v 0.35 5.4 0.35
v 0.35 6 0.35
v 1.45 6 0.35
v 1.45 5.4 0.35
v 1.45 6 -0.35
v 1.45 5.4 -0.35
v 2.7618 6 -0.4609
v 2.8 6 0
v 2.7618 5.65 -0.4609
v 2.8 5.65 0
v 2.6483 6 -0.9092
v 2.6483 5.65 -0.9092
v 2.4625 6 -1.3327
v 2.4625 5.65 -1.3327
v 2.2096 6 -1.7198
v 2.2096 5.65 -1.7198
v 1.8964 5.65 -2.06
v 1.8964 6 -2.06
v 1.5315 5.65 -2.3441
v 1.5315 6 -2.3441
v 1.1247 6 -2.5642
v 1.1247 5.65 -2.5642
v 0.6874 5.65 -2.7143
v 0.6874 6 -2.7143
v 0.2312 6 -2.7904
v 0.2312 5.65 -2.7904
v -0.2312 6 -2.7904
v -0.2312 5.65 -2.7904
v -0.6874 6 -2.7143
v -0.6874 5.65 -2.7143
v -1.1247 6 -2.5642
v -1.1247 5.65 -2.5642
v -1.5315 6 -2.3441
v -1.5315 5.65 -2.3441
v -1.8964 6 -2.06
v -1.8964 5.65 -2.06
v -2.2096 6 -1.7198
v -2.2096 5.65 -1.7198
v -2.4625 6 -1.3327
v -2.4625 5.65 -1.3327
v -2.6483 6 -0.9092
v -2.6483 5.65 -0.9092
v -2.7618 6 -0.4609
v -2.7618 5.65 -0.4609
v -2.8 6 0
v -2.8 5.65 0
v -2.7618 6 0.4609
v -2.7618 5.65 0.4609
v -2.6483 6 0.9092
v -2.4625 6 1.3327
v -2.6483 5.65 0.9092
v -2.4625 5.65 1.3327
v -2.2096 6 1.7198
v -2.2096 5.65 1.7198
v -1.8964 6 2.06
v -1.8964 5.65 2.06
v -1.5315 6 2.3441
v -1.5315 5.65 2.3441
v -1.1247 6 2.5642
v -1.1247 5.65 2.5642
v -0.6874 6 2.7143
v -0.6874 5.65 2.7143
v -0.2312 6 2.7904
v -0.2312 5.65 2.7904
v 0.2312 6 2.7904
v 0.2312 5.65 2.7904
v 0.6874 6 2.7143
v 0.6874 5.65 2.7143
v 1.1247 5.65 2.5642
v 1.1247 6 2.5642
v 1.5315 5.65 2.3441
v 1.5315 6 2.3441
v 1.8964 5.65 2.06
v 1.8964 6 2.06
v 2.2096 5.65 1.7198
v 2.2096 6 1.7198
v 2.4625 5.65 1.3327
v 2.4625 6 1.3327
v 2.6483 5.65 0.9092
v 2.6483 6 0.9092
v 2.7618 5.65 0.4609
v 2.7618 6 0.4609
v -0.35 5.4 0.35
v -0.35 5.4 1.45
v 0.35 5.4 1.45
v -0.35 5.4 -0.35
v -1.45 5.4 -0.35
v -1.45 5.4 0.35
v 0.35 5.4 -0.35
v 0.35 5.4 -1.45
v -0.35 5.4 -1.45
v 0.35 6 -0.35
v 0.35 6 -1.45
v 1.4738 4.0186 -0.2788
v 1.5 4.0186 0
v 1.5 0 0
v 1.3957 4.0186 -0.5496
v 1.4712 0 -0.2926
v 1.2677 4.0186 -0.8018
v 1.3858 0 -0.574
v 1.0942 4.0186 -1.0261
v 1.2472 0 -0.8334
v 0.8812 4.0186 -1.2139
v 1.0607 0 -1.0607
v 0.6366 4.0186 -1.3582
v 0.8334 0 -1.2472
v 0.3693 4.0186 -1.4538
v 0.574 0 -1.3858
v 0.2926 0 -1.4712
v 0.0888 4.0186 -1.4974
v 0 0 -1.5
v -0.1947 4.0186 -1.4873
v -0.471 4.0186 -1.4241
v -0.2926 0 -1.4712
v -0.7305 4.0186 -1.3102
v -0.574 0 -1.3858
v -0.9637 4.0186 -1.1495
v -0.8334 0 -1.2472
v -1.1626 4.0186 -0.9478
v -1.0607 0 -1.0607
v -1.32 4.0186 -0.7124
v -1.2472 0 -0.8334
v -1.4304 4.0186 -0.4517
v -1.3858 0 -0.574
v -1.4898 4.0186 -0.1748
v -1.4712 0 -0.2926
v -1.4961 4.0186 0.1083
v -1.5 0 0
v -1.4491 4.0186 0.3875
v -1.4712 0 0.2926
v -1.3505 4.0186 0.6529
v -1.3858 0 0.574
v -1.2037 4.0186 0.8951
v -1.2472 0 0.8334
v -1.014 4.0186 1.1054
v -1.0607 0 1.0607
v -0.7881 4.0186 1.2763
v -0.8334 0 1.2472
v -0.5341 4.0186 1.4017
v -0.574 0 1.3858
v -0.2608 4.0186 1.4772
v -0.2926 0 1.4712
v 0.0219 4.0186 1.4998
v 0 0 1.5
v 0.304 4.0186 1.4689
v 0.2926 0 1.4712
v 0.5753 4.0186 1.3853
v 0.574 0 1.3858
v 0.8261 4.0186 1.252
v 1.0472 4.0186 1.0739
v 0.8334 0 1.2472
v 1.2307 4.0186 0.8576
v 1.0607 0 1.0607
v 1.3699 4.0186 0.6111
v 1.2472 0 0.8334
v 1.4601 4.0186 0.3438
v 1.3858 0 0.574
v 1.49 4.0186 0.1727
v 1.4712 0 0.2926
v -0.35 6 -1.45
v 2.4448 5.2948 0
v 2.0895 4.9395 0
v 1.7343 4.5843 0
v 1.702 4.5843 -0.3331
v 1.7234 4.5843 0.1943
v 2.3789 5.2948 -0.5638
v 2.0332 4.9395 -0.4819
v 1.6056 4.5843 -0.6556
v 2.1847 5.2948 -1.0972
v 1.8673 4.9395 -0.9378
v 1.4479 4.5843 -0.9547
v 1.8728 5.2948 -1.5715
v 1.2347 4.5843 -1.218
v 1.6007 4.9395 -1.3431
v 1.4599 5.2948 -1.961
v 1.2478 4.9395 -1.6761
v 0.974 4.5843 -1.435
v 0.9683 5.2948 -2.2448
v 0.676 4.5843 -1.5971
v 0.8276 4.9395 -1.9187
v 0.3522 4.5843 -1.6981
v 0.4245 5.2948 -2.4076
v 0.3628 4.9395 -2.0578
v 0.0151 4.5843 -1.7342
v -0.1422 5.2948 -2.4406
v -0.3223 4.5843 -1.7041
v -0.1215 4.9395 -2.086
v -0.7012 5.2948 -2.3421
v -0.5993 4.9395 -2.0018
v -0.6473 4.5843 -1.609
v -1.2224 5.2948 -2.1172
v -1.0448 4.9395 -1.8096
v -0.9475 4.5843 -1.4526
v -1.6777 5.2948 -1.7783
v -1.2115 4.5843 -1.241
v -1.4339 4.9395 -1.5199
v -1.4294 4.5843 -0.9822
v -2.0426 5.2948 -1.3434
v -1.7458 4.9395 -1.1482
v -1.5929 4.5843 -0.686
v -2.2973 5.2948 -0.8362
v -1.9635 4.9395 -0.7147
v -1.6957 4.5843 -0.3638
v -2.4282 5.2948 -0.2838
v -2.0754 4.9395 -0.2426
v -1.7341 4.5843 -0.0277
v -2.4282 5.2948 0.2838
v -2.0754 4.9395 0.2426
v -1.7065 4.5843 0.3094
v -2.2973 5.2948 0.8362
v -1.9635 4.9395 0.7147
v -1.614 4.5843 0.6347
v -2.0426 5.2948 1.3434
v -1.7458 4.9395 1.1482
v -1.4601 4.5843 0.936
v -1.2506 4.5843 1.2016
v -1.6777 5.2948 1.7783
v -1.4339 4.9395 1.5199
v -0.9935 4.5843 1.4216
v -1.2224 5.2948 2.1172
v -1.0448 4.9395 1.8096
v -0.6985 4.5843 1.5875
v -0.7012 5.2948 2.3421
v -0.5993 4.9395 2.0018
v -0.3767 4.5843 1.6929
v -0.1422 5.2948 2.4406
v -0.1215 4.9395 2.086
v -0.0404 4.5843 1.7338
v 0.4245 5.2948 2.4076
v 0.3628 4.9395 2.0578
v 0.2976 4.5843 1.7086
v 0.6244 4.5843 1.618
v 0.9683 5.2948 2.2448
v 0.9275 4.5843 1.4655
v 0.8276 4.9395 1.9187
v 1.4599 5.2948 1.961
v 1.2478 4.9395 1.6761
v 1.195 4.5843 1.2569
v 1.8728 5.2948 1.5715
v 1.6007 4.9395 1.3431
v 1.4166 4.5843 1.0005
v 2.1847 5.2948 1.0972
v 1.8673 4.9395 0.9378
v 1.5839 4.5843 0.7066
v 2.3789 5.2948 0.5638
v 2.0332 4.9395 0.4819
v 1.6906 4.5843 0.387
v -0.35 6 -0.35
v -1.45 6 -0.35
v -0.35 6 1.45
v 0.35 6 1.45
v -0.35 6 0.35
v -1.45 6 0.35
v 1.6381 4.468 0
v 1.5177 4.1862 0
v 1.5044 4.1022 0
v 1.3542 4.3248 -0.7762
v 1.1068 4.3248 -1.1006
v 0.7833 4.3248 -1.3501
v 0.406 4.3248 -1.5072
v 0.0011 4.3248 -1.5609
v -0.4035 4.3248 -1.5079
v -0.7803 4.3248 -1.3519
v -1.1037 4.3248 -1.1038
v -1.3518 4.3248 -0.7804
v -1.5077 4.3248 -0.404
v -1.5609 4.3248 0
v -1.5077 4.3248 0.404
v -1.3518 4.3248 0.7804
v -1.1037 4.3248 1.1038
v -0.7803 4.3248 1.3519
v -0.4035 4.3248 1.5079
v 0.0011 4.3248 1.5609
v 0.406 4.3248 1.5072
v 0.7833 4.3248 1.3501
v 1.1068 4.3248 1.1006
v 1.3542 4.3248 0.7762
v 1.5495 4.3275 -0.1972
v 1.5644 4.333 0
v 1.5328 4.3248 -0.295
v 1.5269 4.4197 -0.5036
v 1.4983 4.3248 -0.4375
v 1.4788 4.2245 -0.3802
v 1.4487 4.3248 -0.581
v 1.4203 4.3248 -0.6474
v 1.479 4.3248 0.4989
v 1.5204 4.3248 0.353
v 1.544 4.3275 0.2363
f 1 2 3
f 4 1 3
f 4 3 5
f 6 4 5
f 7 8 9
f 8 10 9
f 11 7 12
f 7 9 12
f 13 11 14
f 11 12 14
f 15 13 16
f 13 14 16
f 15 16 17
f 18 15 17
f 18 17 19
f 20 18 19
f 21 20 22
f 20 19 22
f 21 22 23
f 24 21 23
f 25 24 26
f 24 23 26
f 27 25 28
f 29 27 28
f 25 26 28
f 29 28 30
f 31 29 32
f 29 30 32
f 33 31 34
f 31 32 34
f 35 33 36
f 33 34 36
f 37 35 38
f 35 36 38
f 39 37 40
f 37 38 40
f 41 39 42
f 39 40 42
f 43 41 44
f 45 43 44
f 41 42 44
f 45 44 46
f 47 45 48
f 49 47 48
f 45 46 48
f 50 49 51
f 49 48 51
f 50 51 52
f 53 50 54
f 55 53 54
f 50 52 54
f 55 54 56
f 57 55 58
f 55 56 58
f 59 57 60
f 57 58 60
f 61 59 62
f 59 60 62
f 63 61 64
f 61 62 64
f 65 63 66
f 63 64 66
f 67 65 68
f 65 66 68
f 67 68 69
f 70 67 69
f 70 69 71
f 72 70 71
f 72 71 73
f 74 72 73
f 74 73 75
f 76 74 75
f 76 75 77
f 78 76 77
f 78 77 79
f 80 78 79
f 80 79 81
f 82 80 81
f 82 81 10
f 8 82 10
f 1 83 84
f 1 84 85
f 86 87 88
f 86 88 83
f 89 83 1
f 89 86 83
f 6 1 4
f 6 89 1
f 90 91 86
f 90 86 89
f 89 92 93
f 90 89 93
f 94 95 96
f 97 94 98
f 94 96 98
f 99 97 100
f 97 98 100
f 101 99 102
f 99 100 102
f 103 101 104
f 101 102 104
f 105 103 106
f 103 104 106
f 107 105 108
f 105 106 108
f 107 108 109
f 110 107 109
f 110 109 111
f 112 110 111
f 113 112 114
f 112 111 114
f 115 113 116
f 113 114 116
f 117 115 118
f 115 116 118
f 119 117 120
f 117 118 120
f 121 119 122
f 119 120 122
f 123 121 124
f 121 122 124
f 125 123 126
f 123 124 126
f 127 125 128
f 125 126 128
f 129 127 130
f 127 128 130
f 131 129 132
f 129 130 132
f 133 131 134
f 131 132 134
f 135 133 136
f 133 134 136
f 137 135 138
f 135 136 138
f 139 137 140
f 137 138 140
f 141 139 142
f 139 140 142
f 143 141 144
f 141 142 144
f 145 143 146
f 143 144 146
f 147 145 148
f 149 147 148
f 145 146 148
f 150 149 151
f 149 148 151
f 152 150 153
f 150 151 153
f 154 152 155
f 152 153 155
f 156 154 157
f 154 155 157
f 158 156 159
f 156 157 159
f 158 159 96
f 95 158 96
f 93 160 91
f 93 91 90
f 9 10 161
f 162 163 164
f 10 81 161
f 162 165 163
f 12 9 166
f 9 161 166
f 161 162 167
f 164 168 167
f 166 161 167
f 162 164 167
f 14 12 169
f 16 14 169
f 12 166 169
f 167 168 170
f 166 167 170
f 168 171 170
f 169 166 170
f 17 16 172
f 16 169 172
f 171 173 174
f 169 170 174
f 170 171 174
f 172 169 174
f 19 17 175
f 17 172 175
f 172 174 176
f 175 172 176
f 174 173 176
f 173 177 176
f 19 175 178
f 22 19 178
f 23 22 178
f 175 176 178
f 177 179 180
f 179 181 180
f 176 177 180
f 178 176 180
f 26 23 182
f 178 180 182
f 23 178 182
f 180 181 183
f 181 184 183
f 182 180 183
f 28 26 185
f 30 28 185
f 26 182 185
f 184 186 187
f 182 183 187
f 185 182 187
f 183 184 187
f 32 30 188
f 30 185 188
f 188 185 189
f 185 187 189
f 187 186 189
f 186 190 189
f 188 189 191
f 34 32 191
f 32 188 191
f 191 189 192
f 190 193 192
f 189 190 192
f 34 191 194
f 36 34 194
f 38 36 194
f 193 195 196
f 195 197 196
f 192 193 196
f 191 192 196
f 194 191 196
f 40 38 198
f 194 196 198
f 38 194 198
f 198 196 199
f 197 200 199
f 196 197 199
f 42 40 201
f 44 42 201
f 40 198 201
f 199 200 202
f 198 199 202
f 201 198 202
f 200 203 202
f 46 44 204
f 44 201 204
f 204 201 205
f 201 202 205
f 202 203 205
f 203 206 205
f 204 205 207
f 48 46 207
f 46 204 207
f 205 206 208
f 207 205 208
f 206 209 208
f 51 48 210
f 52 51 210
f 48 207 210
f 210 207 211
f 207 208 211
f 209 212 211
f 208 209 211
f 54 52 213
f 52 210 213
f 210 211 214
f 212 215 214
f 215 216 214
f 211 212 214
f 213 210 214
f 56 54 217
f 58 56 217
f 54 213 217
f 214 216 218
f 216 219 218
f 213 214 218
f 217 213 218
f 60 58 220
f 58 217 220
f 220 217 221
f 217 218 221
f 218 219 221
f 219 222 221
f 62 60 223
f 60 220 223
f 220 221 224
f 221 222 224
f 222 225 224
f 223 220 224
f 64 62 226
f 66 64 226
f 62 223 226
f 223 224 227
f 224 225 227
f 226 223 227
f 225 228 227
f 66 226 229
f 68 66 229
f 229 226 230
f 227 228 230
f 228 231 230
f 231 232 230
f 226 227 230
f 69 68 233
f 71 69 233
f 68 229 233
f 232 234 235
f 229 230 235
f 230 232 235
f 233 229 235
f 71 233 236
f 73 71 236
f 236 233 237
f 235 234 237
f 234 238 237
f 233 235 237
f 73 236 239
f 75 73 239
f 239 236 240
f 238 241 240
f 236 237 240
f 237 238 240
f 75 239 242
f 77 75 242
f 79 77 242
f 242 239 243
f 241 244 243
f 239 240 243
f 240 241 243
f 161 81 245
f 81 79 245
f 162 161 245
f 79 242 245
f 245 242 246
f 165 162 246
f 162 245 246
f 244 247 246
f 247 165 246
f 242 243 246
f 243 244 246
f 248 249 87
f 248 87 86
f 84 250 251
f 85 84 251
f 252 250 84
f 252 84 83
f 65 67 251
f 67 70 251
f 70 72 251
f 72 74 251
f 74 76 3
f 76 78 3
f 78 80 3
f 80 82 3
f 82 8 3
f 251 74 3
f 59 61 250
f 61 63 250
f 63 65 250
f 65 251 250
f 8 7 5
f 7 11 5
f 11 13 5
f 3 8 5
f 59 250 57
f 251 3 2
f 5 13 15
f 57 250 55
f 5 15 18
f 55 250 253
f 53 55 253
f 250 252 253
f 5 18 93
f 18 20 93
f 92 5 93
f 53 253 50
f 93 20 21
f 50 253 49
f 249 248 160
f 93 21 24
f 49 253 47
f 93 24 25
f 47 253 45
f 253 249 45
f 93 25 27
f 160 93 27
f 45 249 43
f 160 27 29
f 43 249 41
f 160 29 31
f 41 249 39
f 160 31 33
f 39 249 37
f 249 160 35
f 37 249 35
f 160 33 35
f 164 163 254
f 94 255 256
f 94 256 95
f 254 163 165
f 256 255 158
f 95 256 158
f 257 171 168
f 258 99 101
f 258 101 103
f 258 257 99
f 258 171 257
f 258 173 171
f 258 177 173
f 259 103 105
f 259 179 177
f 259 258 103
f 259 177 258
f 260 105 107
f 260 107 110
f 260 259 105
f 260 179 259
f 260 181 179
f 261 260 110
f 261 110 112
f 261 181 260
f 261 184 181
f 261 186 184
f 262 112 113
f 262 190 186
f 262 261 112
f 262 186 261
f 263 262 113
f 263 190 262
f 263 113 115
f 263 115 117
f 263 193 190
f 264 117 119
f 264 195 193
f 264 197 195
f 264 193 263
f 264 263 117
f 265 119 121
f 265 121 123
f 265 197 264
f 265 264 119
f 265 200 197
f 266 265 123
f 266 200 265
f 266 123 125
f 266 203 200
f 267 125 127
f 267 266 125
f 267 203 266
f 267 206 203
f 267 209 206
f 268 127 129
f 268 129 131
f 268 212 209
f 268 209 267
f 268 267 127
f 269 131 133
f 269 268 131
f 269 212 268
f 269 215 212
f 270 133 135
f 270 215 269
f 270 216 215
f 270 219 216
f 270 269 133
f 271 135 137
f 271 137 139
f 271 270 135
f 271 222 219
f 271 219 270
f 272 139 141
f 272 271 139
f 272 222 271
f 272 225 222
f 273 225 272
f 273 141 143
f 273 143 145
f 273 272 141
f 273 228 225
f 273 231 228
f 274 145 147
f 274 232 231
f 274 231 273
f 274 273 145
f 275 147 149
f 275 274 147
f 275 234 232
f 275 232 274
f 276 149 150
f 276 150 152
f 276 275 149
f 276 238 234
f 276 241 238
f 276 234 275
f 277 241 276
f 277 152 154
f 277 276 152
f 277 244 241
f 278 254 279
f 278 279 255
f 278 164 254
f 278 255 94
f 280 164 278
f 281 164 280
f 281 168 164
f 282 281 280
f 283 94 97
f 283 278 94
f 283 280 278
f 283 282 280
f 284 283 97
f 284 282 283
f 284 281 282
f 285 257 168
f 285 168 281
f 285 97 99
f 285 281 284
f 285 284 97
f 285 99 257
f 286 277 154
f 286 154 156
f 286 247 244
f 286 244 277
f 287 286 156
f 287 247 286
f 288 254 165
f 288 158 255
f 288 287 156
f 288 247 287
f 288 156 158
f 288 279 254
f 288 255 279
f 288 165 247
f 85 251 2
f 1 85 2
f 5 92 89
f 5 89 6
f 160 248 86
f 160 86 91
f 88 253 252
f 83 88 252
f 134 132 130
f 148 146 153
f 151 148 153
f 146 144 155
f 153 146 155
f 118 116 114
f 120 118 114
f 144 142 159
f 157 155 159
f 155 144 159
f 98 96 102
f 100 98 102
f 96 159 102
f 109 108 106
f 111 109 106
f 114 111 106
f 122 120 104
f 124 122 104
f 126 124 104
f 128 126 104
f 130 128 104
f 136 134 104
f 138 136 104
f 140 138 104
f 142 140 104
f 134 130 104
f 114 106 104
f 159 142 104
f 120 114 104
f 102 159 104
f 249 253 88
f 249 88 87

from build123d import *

# Parameters (mm, degrees)
FILLET1_R          = 0.8
SKETCH2_W          = 1.1
SKETCH2_H          = 0.7
SKETCH2_W_2        = 0.7
SKETCH2_H_2        = 1.1
CUT_EXTRUDE1_DEPTH = 0.6


with BuildPart() as part:
    # Sketch1 → Revolve1 (revolve)
    with BuildSketch(Plane.XY):
        Polygon((0, 0), (0, 6), (2.8, 6), (2.8, 5.65), (1.5, 4.35), (1.5, 0), align=None)
    revolve(axis=Axis((0, 0, 0), (0, 1, 0)))

    # Fillet1
    fillet1_edges = [part.edges().sort_by_distance(p)[0] for p in [
        (-1.5, 4.35, 0),
    ]]
    fillet(fillet1_edges, radius=FILLET1_R)

    # Sketch2 → Cut-Extrude1 (cut)
    with BuildSketch(Plane(origin=(0, 6, 0), x_dir=(1, 0, 0), z_dir=(0, 1, 0))):
        with Locations((-0.9, 0)):
            Rectangle(SKETCH2_W, SKETCH2_H)
        with Locations((0, 0.9)):
            Rectangle(SKETCH2_W_2, SKETCH2_H_2)
        Rectangle(SKETCH2_W_2, SKETCH2_H)
        with Locations((0.9, 0)):
            Rectangle(SKETCH2_W, SKETCH2_H)
        with Locations((0, -0.9)):
            Rectangle(SKETCH2_W_2, SKETCH2_H_2)
    extrude(amount=-CUT_EXTRUDE1_DEPTH, mode=Mode.SUBTRACT)


solid = part.part
